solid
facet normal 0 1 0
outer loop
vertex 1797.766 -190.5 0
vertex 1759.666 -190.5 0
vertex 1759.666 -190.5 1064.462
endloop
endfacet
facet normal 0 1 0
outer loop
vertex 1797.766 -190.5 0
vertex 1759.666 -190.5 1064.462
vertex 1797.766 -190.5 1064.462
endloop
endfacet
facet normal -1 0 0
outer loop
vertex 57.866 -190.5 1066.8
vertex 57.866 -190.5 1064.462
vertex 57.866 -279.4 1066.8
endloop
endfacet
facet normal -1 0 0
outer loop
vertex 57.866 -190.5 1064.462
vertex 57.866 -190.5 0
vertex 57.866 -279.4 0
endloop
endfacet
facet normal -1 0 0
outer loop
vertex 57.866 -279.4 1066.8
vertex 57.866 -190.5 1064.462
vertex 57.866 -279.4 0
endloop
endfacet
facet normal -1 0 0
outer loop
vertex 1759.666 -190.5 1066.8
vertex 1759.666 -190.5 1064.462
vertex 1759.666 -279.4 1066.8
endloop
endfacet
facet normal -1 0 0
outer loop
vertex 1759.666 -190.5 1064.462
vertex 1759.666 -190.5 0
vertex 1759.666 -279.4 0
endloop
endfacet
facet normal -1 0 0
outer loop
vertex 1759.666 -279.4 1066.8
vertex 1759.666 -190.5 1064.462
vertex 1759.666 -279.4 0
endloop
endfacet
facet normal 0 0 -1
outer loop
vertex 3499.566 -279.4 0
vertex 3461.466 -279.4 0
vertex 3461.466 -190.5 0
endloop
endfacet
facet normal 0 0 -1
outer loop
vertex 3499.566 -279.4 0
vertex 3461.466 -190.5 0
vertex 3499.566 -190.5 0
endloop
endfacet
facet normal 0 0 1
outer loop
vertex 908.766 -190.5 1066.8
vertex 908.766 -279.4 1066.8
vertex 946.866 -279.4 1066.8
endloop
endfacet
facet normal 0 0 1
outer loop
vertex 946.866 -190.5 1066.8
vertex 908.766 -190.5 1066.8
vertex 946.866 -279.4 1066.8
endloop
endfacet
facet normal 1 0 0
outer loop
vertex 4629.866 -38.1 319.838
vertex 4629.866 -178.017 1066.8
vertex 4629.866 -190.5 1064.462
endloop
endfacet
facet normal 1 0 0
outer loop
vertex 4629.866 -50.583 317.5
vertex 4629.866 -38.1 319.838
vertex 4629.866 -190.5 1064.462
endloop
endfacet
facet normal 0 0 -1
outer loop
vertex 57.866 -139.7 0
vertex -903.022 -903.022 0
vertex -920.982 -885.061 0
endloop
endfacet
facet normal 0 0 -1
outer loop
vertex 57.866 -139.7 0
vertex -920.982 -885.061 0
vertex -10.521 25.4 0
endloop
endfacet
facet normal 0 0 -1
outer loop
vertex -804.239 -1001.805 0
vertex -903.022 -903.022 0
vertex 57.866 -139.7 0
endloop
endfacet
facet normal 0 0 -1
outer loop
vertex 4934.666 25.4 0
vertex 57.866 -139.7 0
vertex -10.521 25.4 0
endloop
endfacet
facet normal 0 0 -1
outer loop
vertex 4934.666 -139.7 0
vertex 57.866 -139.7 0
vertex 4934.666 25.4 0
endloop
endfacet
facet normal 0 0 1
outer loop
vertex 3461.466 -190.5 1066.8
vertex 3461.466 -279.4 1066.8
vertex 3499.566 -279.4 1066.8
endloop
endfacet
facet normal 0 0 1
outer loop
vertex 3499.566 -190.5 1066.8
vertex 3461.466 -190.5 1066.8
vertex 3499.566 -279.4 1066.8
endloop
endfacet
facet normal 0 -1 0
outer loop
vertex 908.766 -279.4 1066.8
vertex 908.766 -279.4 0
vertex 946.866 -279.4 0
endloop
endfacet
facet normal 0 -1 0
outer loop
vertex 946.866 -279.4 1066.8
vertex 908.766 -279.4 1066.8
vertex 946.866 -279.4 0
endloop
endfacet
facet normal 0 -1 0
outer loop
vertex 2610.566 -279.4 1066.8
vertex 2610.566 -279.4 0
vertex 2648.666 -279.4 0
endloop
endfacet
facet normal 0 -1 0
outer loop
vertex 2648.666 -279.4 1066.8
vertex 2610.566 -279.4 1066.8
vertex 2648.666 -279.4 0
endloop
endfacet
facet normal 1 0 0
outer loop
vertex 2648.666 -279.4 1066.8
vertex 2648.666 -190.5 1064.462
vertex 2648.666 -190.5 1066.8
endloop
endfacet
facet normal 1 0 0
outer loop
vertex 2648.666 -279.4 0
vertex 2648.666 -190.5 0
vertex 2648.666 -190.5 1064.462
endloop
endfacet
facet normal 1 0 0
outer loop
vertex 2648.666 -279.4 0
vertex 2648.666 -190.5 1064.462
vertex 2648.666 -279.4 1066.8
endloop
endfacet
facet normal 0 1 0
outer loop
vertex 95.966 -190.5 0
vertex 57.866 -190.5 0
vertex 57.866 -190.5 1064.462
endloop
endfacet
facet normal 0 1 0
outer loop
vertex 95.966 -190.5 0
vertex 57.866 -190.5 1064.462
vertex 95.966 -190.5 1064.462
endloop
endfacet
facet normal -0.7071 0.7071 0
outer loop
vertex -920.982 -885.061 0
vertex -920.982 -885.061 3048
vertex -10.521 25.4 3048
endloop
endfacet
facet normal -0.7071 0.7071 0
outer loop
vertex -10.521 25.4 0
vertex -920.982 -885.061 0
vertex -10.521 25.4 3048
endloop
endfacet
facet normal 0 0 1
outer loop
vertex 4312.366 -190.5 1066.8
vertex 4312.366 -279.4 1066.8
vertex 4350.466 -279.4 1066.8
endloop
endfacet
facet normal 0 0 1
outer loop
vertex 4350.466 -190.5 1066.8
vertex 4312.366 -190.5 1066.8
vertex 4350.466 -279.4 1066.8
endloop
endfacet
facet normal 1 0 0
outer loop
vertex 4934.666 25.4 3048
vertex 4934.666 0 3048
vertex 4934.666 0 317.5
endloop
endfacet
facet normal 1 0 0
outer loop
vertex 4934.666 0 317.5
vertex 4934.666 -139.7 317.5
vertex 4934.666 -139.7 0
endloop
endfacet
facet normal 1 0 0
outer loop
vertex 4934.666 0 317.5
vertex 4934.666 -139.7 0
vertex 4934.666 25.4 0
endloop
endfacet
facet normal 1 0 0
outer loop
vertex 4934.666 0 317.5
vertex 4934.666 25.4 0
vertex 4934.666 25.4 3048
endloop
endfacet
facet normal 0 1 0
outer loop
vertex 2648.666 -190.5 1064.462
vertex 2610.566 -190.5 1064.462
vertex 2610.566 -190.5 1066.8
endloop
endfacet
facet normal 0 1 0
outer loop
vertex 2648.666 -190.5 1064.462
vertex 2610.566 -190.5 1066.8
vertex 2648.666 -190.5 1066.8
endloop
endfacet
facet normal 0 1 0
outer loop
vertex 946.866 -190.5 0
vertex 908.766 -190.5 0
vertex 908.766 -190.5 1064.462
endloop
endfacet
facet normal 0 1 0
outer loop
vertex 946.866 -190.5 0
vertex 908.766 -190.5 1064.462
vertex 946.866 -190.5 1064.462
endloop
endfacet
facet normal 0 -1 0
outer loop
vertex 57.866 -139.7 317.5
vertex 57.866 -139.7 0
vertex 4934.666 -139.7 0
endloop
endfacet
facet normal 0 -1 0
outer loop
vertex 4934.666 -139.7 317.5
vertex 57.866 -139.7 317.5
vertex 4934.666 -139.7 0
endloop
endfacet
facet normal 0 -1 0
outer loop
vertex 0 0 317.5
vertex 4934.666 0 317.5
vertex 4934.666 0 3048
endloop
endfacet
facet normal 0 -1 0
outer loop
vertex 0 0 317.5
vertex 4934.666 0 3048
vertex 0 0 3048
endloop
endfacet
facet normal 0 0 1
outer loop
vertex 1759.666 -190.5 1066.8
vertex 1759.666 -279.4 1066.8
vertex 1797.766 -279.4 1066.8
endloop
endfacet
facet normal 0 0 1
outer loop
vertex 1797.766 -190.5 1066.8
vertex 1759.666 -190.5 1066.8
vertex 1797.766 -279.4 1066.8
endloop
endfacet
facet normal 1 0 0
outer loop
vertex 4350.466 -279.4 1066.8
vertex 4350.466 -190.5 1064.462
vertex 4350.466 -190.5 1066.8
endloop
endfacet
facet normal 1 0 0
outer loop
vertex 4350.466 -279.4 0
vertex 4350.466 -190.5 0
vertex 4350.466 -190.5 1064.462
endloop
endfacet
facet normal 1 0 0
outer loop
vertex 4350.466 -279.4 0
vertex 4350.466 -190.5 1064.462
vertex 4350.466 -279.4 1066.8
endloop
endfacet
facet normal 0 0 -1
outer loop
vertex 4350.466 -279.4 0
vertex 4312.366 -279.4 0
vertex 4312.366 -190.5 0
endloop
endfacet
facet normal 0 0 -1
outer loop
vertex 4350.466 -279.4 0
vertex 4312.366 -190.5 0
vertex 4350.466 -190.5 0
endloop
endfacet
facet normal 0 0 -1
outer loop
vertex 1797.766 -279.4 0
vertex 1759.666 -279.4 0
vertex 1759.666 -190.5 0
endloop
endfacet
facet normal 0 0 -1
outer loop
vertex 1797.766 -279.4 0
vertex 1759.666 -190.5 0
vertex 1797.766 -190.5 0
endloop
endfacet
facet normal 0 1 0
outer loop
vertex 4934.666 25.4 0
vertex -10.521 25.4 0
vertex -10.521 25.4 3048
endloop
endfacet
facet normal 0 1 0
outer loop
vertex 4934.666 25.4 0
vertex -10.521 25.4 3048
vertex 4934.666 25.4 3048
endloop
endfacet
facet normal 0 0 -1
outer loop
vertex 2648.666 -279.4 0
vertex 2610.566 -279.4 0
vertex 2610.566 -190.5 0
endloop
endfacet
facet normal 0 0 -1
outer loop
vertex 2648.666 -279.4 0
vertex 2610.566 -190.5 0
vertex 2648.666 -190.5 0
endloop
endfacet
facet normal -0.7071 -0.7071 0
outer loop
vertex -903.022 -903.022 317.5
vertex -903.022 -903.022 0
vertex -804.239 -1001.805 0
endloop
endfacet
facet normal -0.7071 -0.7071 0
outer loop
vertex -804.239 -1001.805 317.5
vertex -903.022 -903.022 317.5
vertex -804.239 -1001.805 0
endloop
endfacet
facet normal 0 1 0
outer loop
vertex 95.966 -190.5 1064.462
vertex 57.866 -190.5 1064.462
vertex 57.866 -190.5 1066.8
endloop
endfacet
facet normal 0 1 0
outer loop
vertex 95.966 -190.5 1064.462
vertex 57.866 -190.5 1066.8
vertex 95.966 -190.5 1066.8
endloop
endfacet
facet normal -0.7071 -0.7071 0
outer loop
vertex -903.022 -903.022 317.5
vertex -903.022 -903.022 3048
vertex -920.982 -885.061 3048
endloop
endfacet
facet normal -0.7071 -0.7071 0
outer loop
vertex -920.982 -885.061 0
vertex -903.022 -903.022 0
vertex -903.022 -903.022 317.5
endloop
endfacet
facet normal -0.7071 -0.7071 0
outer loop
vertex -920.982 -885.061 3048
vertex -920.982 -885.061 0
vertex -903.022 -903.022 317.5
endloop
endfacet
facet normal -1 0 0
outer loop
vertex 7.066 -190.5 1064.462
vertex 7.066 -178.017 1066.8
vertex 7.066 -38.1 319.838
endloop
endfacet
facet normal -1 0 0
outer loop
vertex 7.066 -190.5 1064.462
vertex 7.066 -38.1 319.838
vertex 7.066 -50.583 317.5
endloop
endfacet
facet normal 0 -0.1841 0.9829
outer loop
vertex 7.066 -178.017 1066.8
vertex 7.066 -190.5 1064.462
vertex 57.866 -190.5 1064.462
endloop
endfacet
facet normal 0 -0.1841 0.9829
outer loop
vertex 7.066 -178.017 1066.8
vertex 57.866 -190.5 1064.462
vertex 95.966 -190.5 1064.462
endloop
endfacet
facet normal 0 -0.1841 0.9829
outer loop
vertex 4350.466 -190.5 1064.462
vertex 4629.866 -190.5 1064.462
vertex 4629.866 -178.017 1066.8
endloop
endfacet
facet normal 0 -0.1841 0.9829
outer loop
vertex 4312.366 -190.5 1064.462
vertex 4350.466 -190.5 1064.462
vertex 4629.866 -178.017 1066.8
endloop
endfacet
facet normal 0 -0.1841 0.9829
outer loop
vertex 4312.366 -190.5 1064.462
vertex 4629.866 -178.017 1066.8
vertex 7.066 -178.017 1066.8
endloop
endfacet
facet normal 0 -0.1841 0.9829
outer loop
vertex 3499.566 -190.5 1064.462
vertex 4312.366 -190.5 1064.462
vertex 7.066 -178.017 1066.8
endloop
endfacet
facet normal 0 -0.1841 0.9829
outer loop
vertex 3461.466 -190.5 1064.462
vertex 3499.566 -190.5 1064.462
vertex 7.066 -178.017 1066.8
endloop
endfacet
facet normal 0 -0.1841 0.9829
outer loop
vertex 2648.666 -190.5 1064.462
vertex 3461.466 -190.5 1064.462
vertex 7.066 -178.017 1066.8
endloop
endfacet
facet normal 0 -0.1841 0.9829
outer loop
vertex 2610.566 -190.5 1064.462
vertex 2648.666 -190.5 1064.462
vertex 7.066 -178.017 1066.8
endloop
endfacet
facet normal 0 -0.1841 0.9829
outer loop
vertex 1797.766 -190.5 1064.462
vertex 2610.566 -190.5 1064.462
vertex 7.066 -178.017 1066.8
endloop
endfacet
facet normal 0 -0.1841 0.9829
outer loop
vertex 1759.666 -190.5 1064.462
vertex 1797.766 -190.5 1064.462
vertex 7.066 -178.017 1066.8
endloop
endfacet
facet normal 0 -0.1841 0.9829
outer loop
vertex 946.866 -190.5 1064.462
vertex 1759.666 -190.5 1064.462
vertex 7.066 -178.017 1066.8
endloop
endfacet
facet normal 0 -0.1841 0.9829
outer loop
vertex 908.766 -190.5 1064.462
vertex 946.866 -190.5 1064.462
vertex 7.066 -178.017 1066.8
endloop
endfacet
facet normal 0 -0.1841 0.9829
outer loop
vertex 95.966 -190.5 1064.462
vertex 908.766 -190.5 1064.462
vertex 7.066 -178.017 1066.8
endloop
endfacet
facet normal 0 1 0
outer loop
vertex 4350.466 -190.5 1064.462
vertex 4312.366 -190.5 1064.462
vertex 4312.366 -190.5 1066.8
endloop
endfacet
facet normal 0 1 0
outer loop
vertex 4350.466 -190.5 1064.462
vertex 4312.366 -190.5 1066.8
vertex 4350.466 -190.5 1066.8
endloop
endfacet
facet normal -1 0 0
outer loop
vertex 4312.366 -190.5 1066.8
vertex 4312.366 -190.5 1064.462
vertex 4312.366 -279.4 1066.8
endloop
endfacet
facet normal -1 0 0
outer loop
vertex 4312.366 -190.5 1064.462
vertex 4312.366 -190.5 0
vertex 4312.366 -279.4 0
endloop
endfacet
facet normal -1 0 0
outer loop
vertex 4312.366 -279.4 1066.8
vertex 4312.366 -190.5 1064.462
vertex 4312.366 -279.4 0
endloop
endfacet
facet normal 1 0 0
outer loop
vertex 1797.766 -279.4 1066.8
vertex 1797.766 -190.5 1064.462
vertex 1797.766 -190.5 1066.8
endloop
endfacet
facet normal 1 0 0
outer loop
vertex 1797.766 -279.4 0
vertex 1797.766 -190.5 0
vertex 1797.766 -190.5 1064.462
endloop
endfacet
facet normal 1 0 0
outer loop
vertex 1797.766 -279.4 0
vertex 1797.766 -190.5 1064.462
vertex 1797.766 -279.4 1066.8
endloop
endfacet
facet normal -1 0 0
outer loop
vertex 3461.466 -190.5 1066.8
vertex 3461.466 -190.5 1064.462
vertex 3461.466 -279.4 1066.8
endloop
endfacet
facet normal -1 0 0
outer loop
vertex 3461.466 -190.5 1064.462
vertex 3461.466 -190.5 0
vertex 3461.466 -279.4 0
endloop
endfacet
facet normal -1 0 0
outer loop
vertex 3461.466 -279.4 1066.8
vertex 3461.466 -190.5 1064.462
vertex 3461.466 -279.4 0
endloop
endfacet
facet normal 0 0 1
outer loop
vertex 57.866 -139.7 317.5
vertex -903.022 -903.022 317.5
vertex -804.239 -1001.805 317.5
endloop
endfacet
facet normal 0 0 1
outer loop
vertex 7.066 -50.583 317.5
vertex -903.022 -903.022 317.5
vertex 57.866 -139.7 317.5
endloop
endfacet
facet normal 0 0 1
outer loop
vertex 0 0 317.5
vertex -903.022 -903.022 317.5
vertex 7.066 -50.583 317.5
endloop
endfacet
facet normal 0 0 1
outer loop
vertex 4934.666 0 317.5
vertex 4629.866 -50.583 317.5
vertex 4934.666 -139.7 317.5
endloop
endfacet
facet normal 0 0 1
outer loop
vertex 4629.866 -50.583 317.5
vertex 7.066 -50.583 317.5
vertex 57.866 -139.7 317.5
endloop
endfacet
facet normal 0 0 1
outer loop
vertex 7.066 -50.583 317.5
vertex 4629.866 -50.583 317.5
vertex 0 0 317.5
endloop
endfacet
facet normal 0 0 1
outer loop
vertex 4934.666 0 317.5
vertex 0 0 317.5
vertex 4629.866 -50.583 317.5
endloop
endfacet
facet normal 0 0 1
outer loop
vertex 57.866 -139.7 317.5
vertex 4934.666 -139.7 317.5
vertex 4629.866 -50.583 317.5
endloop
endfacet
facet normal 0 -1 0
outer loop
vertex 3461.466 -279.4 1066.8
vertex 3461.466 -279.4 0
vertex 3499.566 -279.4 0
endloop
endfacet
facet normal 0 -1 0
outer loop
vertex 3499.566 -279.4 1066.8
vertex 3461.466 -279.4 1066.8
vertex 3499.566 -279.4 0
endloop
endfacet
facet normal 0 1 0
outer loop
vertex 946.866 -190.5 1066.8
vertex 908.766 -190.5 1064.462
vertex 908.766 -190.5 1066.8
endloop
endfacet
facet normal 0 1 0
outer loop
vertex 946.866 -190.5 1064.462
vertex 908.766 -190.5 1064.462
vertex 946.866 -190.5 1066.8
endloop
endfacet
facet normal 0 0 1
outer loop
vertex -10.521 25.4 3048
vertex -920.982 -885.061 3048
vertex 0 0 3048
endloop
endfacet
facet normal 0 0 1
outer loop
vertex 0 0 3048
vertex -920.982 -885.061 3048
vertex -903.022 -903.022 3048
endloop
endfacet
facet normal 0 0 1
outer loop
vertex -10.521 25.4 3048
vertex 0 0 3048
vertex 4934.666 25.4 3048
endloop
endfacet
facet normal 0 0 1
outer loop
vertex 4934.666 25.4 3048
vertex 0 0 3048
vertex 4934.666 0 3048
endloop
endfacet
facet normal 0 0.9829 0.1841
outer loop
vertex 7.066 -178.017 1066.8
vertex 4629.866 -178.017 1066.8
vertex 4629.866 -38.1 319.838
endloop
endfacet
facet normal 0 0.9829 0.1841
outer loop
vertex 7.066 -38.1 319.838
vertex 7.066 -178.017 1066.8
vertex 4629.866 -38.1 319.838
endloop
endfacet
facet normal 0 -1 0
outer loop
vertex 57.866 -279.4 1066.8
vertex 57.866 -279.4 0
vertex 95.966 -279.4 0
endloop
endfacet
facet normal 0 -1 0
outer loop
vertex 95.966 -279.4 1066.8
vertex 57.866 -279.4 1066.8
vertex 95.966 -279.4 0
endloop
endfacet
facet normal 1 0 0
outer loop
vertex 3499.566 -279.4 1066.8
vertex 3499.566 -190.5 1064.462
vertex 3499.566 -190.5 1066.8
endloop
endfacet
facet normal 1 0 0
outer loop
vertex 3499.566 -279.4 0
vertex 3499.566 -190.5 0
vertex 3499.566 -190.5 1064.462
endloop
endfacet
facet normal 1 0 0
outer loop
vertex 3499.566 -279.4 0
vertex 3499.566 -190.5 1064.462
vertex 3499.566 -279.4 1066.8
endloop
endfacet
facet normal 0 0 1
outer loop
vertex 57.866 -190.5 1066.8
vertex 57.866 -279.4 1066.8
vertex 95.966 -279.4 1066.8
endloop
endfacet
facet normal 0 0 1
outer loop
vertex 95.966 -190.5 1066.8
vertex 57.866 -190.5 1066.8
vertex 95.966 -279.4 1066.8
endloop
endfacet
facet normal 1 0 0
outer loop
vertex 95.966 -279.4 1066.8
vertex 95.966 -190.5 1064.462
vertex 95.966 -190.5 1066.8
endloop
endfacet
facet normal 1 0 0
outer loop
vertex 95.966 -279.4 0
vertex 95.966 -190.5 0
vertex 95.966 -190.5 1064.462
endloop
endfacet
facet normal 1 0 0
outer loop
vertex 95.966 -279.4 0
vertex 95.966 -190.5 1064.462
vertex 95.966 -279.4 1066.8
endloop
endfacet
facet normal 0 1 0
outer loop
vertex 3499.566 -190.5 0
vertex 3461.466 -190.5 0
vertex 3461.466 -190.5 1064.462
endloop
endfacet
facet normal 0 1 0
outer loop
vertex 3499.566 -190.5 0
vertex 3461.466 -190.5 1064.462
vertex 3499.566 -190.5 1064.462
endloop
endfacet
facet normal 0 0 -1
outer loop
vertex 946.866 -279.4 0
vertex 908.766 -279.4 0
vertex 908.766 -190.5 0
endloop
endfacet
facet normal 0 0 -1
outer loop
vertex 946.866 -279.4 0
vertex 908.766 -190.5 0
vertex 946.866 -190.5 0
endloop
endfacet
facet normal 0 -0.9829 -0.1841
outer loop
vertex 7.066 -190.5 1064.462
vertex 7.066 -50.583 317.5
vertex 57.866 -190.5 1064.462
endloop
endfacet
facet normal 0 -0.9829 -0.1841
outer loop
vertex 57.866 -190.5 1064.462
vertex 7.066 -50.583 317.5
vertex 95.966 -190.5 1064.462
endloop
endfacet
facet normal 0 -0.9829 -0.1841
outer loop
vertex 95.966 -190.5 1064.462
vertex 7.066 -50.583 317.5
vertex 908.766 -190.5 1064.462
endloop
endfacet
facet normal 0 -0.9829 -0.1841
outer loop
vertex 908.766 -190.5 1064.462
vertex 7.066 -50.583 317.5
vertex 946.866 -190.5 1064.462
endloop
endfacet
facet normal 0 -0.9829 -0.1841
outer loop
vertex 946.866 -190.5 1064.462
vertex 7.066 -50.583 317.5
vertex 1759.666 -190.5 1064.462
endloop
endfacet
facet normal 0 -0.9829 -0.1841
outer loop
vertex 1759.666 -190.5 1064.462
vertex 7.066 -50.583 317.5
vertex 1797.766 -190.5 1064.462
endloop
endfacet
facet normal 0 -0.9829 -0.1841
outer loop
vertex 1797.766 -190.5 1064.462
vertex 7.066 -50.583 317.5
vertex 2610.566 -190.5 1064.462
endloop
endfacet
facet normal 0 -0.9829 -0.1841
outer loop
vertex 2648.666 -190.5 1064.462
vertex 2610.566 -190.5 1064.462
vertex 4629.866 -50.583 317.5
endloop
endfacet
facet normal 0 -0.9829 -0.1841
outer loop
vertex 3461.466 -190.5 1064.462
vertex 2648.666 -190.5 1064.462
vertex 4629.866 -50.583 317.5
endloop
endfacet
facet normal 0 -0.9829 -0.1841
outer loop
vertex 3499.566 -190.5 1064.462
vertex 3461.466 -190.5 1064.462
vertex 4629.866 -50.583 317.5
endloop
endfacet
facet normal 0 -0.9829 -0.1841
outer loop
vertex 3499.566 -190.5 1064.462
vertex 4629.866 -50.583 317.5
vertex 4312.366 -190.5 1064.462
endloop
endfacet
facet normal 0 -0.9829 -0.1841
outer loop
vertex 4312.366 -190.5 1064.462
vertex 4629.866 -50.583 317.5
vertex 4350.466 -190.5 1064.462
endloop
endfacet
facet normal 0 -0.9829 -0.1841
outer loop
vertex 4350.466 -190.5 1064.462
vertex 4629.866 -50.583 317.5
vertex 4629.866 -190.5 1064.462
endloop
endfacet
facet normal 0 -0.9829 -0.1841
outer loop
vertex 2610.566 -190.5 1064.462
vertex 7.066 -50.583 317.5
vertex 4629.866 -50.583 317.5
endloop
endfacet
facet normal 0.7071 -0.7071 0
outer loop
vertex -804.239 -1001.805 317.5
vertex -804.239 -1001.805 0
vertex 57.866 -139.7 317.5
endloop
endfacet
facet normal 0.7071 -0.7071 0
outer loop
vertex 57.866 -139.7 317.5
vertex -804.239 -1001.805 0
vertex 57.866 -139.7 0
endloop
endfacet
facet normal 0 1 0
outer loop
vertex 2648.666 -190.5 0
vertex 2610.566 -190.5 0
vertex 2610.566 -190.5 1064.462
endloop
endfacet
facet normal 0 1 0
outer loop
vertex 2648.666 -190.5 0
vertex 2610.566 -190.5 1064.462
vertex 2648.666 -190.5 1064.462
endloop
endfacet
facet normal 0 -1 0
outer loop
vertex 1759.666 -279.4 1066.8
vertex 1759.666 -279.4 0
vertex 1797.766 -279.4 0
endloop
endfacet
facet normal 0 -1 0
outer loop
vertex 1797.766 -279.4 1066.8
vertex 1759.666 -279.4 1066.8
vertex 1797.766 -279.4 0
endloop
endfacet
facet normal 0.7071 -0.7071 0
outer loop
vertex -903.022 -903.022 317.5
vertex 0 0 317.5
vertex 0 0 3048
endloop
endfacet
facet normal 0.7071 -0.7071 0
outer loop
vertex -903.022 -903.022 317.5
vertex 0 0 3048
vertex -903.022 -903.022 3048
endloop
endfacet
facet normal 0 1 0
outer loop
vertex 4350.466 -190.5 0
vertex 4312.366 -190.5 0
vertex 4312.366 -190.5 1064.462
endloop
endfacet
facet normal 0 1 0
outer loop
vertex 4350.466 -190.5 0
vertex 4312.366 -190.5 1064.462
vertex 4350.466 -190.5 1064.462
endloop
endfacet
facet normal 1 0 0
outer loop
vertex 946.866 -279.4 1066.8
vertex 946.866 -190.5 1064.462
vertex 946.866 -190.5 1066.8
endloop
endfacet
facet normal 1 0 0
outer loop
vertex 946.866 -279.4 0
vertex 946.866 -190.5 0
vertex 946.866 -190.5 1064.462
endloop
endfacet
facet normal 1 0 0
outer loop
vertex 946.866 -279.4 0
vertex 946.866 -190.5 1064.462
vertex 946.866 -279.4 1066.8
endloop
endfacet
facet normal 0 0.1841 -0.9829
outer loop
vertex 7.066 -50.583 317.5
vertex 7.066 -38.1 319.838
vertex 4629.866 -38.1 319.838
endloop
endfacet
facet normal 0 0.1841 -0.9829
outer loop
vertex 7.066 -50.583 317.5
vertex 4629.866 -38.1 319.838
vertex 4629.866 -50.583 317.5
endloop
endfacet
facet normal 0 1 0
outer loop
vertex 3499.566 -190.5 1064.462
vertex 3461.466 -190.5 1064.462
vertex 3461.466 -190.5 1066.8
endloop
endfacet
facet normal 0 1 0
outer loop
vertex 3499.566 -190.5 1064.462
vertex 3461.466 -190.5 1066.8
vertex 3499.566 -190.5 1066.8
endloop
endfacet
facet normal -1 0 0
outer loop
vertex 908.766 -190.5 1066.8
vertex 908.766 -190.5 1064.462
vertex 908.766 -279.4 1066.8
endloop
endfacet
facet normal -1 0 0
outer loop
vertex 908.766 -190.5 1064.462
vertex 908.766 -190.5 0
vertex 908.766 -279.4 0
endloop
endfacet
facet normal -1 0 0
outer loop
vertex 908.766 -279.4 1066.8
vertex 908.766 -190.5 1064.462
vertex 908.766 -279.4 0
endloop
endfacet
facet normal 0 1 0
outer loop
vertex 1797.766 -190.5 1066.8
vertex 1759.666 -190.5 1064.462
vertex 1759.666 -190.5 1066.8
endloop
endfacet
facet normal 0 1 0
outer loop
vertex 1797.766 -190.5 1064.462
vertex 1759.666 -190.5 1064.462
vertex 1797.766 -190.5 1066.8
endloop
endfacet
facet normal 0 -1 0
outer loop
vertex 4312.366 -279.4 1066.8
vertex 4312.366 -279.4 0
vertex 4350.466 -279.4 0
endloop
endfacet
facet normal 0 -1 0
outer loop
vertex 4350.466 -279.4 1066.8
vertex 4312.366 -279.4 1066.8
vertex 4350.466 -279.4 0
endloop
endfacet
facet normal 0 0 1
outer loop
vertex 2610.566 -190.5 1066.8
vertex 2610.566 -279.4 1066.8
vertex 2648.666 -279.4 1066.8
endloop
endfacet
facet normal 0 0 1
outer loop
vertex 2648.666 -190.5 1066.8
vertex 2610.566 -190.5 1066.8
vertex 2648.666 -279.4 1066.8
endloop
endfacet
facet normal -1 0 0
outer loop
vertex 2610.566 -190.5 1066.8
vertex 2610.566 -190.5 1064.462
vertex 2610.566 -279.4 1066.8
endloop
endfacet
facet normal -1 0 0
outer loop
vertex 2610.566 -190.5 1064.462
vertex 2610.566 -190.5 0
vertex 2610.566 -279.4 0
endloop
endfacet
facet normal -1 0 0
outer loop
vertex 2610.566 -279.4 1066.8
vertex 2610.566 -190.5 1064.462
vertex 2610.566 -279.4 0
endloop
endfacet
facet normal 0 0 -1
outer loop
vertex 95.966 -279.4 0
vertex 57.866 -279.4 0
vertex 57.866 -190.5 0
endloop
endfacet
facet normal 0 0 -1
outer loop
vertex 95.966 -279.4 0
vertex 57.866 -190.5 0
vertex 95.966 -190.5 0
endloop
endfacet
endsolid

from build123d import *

# Parameters (mm, degrees)
F1_DEPTH      = 317.5
F3_DEPTH      = 3048
F4_W          = 38.1
F4_H          = 88.9
F5_DEPTH      = 1066.8
F8_DEPTH      = 4572
F8_DEPTH_BACK = 50.8


with BuildPart() as f1:
    # F0 (on Top) → F1 (new body)
    with BuildSketch(Plane.XY):
        Polygon((4934.6656346635, 0), (0, 0), (-903.0217702909, -903.0217702909), (-804.2389529591, -1001.8045876226), (57.8656346635, -139.7), (4934.6656346635, -139.7), align=None)
    extrude(amount=F1_DEPTH)

    # F2 (on face) → F3 (join)
    with BuildSketch(Plane(origin=(0, 0, 0), x_dir=(1, 0, 0), z_dir=(0, 0, -1))):
        Polygon((0, 0), (-903.0217702909, 903.0217702909), (-920.982282533, 885.0612580487), (-10.5210244843, -25.4), (4934.6656346635, -25.4), (4934.6656346635, 0), align=None)
    extrude(amount=-F3_DEPTH)



with BuildPart() as f5:
    # F4 (on face) → F5 (new body)
    with BuildSketch(Plane(origin=(0, 0, 0), x_dir=(1, 0, 0), z_dir=(0, 0, -1))):
        with Locations((76.9156346635, 234.95)):
            Rectangle(F4_W, F4_H)
    extrude(amount=-F5_DEPTH)


with BuildPart() as f5b:
    # F4 (on face) → F5, piece 2 (new body)
    with BuildSketch(Plane(origin=(0, 0, 0), x_dir=(1, 0, 0), z_dir=(0, 0, -1))):
        with Locations((927.8156346635, 234.95)):
            Rectangle(F4_W, F4_H)
    extrude(amount=-F5_DEPTH)


with BuildPart() as f5c:
    # F4 (on face) → F5, piece 3 (new body)
    with BuildSketch(Plane(origin=(0, 0, 0), x_dir=(1, 0, 0), z_dir=(0, 0, -1))):
        with Locations((1778.7156346635, 234.95)):
            Rectangle(F4_W, F4_H)
    extrude(amount=-F5_DEPTH)


with BuildPart() as f5d:
    # F4 (on face) → F5, piece 4 (new body)
    with BuildSketch(Plane(origin=(0, 0, 0), x_dir=(1, 0, 0), z_dir=(0, 0, -1))):
        with Locations((2629.6156346635, 234.95)):
            Rectangle(F4_W, F4_H)
    extrude(amount=-F5_DEPTH)


with BuildPart() as f5e:
    # F4 (on face) → F5, piece 5 (new body)
    with BuildSketch(Plane(origin=(0, 0, 0), x_dir=(1, 0, 0), z_dir=(0, 0, -1))):
        with Locations((3480.5156346635, 234.95)):
            Rectangle(F4_W, F4_H)
    extrude(amount=-F5_DEPTH)


with BuildPart() as f5f:
    # F4 (on face) → F5, piece 6 (new body)
    with BuildSketch(Plane(origin=(0, 0, 0), x_dir=(1, 0, 0), z_dir=(0, 0, -1))):
        with Locations((4331.4156346635, 234.95)):
            Rectangle(F4_W, F4_H)
    extrude(amount=-F5_DEPTH)


with BuildPart() as f1_1:
    add(f1.part)

    add(f5.part)  # F8 merges F5

    add(f5b.part)  # F8 merges F5b

    add(f5c.part)  # F8 merges F5c

    add(f5d.part)  # F8 merges F5d

    add(f5e.part)  # F8 merges F5e

    add(f5f.part)  # F8 merges F5f
    # F7 (on face) → F8 (join, two sides)
    with BuildSketch(Plane(origin=(57.8656346635, 0, 0), x_dir=(0, -1, 0), z_dir=(-1, 0, 0))) as f8_sk:
        Polygon((178.0171050144, 1066.8), (38.1, 319.8382328325), (50.5828949856, 317.5), (190.5, 1064.4617671675), align=None)
    extrude(amount=-F8_DEPTH)
    extrude(f8_sk.sketch, amount=F8_DEPTH_BACK)


solid = f1_1.part
